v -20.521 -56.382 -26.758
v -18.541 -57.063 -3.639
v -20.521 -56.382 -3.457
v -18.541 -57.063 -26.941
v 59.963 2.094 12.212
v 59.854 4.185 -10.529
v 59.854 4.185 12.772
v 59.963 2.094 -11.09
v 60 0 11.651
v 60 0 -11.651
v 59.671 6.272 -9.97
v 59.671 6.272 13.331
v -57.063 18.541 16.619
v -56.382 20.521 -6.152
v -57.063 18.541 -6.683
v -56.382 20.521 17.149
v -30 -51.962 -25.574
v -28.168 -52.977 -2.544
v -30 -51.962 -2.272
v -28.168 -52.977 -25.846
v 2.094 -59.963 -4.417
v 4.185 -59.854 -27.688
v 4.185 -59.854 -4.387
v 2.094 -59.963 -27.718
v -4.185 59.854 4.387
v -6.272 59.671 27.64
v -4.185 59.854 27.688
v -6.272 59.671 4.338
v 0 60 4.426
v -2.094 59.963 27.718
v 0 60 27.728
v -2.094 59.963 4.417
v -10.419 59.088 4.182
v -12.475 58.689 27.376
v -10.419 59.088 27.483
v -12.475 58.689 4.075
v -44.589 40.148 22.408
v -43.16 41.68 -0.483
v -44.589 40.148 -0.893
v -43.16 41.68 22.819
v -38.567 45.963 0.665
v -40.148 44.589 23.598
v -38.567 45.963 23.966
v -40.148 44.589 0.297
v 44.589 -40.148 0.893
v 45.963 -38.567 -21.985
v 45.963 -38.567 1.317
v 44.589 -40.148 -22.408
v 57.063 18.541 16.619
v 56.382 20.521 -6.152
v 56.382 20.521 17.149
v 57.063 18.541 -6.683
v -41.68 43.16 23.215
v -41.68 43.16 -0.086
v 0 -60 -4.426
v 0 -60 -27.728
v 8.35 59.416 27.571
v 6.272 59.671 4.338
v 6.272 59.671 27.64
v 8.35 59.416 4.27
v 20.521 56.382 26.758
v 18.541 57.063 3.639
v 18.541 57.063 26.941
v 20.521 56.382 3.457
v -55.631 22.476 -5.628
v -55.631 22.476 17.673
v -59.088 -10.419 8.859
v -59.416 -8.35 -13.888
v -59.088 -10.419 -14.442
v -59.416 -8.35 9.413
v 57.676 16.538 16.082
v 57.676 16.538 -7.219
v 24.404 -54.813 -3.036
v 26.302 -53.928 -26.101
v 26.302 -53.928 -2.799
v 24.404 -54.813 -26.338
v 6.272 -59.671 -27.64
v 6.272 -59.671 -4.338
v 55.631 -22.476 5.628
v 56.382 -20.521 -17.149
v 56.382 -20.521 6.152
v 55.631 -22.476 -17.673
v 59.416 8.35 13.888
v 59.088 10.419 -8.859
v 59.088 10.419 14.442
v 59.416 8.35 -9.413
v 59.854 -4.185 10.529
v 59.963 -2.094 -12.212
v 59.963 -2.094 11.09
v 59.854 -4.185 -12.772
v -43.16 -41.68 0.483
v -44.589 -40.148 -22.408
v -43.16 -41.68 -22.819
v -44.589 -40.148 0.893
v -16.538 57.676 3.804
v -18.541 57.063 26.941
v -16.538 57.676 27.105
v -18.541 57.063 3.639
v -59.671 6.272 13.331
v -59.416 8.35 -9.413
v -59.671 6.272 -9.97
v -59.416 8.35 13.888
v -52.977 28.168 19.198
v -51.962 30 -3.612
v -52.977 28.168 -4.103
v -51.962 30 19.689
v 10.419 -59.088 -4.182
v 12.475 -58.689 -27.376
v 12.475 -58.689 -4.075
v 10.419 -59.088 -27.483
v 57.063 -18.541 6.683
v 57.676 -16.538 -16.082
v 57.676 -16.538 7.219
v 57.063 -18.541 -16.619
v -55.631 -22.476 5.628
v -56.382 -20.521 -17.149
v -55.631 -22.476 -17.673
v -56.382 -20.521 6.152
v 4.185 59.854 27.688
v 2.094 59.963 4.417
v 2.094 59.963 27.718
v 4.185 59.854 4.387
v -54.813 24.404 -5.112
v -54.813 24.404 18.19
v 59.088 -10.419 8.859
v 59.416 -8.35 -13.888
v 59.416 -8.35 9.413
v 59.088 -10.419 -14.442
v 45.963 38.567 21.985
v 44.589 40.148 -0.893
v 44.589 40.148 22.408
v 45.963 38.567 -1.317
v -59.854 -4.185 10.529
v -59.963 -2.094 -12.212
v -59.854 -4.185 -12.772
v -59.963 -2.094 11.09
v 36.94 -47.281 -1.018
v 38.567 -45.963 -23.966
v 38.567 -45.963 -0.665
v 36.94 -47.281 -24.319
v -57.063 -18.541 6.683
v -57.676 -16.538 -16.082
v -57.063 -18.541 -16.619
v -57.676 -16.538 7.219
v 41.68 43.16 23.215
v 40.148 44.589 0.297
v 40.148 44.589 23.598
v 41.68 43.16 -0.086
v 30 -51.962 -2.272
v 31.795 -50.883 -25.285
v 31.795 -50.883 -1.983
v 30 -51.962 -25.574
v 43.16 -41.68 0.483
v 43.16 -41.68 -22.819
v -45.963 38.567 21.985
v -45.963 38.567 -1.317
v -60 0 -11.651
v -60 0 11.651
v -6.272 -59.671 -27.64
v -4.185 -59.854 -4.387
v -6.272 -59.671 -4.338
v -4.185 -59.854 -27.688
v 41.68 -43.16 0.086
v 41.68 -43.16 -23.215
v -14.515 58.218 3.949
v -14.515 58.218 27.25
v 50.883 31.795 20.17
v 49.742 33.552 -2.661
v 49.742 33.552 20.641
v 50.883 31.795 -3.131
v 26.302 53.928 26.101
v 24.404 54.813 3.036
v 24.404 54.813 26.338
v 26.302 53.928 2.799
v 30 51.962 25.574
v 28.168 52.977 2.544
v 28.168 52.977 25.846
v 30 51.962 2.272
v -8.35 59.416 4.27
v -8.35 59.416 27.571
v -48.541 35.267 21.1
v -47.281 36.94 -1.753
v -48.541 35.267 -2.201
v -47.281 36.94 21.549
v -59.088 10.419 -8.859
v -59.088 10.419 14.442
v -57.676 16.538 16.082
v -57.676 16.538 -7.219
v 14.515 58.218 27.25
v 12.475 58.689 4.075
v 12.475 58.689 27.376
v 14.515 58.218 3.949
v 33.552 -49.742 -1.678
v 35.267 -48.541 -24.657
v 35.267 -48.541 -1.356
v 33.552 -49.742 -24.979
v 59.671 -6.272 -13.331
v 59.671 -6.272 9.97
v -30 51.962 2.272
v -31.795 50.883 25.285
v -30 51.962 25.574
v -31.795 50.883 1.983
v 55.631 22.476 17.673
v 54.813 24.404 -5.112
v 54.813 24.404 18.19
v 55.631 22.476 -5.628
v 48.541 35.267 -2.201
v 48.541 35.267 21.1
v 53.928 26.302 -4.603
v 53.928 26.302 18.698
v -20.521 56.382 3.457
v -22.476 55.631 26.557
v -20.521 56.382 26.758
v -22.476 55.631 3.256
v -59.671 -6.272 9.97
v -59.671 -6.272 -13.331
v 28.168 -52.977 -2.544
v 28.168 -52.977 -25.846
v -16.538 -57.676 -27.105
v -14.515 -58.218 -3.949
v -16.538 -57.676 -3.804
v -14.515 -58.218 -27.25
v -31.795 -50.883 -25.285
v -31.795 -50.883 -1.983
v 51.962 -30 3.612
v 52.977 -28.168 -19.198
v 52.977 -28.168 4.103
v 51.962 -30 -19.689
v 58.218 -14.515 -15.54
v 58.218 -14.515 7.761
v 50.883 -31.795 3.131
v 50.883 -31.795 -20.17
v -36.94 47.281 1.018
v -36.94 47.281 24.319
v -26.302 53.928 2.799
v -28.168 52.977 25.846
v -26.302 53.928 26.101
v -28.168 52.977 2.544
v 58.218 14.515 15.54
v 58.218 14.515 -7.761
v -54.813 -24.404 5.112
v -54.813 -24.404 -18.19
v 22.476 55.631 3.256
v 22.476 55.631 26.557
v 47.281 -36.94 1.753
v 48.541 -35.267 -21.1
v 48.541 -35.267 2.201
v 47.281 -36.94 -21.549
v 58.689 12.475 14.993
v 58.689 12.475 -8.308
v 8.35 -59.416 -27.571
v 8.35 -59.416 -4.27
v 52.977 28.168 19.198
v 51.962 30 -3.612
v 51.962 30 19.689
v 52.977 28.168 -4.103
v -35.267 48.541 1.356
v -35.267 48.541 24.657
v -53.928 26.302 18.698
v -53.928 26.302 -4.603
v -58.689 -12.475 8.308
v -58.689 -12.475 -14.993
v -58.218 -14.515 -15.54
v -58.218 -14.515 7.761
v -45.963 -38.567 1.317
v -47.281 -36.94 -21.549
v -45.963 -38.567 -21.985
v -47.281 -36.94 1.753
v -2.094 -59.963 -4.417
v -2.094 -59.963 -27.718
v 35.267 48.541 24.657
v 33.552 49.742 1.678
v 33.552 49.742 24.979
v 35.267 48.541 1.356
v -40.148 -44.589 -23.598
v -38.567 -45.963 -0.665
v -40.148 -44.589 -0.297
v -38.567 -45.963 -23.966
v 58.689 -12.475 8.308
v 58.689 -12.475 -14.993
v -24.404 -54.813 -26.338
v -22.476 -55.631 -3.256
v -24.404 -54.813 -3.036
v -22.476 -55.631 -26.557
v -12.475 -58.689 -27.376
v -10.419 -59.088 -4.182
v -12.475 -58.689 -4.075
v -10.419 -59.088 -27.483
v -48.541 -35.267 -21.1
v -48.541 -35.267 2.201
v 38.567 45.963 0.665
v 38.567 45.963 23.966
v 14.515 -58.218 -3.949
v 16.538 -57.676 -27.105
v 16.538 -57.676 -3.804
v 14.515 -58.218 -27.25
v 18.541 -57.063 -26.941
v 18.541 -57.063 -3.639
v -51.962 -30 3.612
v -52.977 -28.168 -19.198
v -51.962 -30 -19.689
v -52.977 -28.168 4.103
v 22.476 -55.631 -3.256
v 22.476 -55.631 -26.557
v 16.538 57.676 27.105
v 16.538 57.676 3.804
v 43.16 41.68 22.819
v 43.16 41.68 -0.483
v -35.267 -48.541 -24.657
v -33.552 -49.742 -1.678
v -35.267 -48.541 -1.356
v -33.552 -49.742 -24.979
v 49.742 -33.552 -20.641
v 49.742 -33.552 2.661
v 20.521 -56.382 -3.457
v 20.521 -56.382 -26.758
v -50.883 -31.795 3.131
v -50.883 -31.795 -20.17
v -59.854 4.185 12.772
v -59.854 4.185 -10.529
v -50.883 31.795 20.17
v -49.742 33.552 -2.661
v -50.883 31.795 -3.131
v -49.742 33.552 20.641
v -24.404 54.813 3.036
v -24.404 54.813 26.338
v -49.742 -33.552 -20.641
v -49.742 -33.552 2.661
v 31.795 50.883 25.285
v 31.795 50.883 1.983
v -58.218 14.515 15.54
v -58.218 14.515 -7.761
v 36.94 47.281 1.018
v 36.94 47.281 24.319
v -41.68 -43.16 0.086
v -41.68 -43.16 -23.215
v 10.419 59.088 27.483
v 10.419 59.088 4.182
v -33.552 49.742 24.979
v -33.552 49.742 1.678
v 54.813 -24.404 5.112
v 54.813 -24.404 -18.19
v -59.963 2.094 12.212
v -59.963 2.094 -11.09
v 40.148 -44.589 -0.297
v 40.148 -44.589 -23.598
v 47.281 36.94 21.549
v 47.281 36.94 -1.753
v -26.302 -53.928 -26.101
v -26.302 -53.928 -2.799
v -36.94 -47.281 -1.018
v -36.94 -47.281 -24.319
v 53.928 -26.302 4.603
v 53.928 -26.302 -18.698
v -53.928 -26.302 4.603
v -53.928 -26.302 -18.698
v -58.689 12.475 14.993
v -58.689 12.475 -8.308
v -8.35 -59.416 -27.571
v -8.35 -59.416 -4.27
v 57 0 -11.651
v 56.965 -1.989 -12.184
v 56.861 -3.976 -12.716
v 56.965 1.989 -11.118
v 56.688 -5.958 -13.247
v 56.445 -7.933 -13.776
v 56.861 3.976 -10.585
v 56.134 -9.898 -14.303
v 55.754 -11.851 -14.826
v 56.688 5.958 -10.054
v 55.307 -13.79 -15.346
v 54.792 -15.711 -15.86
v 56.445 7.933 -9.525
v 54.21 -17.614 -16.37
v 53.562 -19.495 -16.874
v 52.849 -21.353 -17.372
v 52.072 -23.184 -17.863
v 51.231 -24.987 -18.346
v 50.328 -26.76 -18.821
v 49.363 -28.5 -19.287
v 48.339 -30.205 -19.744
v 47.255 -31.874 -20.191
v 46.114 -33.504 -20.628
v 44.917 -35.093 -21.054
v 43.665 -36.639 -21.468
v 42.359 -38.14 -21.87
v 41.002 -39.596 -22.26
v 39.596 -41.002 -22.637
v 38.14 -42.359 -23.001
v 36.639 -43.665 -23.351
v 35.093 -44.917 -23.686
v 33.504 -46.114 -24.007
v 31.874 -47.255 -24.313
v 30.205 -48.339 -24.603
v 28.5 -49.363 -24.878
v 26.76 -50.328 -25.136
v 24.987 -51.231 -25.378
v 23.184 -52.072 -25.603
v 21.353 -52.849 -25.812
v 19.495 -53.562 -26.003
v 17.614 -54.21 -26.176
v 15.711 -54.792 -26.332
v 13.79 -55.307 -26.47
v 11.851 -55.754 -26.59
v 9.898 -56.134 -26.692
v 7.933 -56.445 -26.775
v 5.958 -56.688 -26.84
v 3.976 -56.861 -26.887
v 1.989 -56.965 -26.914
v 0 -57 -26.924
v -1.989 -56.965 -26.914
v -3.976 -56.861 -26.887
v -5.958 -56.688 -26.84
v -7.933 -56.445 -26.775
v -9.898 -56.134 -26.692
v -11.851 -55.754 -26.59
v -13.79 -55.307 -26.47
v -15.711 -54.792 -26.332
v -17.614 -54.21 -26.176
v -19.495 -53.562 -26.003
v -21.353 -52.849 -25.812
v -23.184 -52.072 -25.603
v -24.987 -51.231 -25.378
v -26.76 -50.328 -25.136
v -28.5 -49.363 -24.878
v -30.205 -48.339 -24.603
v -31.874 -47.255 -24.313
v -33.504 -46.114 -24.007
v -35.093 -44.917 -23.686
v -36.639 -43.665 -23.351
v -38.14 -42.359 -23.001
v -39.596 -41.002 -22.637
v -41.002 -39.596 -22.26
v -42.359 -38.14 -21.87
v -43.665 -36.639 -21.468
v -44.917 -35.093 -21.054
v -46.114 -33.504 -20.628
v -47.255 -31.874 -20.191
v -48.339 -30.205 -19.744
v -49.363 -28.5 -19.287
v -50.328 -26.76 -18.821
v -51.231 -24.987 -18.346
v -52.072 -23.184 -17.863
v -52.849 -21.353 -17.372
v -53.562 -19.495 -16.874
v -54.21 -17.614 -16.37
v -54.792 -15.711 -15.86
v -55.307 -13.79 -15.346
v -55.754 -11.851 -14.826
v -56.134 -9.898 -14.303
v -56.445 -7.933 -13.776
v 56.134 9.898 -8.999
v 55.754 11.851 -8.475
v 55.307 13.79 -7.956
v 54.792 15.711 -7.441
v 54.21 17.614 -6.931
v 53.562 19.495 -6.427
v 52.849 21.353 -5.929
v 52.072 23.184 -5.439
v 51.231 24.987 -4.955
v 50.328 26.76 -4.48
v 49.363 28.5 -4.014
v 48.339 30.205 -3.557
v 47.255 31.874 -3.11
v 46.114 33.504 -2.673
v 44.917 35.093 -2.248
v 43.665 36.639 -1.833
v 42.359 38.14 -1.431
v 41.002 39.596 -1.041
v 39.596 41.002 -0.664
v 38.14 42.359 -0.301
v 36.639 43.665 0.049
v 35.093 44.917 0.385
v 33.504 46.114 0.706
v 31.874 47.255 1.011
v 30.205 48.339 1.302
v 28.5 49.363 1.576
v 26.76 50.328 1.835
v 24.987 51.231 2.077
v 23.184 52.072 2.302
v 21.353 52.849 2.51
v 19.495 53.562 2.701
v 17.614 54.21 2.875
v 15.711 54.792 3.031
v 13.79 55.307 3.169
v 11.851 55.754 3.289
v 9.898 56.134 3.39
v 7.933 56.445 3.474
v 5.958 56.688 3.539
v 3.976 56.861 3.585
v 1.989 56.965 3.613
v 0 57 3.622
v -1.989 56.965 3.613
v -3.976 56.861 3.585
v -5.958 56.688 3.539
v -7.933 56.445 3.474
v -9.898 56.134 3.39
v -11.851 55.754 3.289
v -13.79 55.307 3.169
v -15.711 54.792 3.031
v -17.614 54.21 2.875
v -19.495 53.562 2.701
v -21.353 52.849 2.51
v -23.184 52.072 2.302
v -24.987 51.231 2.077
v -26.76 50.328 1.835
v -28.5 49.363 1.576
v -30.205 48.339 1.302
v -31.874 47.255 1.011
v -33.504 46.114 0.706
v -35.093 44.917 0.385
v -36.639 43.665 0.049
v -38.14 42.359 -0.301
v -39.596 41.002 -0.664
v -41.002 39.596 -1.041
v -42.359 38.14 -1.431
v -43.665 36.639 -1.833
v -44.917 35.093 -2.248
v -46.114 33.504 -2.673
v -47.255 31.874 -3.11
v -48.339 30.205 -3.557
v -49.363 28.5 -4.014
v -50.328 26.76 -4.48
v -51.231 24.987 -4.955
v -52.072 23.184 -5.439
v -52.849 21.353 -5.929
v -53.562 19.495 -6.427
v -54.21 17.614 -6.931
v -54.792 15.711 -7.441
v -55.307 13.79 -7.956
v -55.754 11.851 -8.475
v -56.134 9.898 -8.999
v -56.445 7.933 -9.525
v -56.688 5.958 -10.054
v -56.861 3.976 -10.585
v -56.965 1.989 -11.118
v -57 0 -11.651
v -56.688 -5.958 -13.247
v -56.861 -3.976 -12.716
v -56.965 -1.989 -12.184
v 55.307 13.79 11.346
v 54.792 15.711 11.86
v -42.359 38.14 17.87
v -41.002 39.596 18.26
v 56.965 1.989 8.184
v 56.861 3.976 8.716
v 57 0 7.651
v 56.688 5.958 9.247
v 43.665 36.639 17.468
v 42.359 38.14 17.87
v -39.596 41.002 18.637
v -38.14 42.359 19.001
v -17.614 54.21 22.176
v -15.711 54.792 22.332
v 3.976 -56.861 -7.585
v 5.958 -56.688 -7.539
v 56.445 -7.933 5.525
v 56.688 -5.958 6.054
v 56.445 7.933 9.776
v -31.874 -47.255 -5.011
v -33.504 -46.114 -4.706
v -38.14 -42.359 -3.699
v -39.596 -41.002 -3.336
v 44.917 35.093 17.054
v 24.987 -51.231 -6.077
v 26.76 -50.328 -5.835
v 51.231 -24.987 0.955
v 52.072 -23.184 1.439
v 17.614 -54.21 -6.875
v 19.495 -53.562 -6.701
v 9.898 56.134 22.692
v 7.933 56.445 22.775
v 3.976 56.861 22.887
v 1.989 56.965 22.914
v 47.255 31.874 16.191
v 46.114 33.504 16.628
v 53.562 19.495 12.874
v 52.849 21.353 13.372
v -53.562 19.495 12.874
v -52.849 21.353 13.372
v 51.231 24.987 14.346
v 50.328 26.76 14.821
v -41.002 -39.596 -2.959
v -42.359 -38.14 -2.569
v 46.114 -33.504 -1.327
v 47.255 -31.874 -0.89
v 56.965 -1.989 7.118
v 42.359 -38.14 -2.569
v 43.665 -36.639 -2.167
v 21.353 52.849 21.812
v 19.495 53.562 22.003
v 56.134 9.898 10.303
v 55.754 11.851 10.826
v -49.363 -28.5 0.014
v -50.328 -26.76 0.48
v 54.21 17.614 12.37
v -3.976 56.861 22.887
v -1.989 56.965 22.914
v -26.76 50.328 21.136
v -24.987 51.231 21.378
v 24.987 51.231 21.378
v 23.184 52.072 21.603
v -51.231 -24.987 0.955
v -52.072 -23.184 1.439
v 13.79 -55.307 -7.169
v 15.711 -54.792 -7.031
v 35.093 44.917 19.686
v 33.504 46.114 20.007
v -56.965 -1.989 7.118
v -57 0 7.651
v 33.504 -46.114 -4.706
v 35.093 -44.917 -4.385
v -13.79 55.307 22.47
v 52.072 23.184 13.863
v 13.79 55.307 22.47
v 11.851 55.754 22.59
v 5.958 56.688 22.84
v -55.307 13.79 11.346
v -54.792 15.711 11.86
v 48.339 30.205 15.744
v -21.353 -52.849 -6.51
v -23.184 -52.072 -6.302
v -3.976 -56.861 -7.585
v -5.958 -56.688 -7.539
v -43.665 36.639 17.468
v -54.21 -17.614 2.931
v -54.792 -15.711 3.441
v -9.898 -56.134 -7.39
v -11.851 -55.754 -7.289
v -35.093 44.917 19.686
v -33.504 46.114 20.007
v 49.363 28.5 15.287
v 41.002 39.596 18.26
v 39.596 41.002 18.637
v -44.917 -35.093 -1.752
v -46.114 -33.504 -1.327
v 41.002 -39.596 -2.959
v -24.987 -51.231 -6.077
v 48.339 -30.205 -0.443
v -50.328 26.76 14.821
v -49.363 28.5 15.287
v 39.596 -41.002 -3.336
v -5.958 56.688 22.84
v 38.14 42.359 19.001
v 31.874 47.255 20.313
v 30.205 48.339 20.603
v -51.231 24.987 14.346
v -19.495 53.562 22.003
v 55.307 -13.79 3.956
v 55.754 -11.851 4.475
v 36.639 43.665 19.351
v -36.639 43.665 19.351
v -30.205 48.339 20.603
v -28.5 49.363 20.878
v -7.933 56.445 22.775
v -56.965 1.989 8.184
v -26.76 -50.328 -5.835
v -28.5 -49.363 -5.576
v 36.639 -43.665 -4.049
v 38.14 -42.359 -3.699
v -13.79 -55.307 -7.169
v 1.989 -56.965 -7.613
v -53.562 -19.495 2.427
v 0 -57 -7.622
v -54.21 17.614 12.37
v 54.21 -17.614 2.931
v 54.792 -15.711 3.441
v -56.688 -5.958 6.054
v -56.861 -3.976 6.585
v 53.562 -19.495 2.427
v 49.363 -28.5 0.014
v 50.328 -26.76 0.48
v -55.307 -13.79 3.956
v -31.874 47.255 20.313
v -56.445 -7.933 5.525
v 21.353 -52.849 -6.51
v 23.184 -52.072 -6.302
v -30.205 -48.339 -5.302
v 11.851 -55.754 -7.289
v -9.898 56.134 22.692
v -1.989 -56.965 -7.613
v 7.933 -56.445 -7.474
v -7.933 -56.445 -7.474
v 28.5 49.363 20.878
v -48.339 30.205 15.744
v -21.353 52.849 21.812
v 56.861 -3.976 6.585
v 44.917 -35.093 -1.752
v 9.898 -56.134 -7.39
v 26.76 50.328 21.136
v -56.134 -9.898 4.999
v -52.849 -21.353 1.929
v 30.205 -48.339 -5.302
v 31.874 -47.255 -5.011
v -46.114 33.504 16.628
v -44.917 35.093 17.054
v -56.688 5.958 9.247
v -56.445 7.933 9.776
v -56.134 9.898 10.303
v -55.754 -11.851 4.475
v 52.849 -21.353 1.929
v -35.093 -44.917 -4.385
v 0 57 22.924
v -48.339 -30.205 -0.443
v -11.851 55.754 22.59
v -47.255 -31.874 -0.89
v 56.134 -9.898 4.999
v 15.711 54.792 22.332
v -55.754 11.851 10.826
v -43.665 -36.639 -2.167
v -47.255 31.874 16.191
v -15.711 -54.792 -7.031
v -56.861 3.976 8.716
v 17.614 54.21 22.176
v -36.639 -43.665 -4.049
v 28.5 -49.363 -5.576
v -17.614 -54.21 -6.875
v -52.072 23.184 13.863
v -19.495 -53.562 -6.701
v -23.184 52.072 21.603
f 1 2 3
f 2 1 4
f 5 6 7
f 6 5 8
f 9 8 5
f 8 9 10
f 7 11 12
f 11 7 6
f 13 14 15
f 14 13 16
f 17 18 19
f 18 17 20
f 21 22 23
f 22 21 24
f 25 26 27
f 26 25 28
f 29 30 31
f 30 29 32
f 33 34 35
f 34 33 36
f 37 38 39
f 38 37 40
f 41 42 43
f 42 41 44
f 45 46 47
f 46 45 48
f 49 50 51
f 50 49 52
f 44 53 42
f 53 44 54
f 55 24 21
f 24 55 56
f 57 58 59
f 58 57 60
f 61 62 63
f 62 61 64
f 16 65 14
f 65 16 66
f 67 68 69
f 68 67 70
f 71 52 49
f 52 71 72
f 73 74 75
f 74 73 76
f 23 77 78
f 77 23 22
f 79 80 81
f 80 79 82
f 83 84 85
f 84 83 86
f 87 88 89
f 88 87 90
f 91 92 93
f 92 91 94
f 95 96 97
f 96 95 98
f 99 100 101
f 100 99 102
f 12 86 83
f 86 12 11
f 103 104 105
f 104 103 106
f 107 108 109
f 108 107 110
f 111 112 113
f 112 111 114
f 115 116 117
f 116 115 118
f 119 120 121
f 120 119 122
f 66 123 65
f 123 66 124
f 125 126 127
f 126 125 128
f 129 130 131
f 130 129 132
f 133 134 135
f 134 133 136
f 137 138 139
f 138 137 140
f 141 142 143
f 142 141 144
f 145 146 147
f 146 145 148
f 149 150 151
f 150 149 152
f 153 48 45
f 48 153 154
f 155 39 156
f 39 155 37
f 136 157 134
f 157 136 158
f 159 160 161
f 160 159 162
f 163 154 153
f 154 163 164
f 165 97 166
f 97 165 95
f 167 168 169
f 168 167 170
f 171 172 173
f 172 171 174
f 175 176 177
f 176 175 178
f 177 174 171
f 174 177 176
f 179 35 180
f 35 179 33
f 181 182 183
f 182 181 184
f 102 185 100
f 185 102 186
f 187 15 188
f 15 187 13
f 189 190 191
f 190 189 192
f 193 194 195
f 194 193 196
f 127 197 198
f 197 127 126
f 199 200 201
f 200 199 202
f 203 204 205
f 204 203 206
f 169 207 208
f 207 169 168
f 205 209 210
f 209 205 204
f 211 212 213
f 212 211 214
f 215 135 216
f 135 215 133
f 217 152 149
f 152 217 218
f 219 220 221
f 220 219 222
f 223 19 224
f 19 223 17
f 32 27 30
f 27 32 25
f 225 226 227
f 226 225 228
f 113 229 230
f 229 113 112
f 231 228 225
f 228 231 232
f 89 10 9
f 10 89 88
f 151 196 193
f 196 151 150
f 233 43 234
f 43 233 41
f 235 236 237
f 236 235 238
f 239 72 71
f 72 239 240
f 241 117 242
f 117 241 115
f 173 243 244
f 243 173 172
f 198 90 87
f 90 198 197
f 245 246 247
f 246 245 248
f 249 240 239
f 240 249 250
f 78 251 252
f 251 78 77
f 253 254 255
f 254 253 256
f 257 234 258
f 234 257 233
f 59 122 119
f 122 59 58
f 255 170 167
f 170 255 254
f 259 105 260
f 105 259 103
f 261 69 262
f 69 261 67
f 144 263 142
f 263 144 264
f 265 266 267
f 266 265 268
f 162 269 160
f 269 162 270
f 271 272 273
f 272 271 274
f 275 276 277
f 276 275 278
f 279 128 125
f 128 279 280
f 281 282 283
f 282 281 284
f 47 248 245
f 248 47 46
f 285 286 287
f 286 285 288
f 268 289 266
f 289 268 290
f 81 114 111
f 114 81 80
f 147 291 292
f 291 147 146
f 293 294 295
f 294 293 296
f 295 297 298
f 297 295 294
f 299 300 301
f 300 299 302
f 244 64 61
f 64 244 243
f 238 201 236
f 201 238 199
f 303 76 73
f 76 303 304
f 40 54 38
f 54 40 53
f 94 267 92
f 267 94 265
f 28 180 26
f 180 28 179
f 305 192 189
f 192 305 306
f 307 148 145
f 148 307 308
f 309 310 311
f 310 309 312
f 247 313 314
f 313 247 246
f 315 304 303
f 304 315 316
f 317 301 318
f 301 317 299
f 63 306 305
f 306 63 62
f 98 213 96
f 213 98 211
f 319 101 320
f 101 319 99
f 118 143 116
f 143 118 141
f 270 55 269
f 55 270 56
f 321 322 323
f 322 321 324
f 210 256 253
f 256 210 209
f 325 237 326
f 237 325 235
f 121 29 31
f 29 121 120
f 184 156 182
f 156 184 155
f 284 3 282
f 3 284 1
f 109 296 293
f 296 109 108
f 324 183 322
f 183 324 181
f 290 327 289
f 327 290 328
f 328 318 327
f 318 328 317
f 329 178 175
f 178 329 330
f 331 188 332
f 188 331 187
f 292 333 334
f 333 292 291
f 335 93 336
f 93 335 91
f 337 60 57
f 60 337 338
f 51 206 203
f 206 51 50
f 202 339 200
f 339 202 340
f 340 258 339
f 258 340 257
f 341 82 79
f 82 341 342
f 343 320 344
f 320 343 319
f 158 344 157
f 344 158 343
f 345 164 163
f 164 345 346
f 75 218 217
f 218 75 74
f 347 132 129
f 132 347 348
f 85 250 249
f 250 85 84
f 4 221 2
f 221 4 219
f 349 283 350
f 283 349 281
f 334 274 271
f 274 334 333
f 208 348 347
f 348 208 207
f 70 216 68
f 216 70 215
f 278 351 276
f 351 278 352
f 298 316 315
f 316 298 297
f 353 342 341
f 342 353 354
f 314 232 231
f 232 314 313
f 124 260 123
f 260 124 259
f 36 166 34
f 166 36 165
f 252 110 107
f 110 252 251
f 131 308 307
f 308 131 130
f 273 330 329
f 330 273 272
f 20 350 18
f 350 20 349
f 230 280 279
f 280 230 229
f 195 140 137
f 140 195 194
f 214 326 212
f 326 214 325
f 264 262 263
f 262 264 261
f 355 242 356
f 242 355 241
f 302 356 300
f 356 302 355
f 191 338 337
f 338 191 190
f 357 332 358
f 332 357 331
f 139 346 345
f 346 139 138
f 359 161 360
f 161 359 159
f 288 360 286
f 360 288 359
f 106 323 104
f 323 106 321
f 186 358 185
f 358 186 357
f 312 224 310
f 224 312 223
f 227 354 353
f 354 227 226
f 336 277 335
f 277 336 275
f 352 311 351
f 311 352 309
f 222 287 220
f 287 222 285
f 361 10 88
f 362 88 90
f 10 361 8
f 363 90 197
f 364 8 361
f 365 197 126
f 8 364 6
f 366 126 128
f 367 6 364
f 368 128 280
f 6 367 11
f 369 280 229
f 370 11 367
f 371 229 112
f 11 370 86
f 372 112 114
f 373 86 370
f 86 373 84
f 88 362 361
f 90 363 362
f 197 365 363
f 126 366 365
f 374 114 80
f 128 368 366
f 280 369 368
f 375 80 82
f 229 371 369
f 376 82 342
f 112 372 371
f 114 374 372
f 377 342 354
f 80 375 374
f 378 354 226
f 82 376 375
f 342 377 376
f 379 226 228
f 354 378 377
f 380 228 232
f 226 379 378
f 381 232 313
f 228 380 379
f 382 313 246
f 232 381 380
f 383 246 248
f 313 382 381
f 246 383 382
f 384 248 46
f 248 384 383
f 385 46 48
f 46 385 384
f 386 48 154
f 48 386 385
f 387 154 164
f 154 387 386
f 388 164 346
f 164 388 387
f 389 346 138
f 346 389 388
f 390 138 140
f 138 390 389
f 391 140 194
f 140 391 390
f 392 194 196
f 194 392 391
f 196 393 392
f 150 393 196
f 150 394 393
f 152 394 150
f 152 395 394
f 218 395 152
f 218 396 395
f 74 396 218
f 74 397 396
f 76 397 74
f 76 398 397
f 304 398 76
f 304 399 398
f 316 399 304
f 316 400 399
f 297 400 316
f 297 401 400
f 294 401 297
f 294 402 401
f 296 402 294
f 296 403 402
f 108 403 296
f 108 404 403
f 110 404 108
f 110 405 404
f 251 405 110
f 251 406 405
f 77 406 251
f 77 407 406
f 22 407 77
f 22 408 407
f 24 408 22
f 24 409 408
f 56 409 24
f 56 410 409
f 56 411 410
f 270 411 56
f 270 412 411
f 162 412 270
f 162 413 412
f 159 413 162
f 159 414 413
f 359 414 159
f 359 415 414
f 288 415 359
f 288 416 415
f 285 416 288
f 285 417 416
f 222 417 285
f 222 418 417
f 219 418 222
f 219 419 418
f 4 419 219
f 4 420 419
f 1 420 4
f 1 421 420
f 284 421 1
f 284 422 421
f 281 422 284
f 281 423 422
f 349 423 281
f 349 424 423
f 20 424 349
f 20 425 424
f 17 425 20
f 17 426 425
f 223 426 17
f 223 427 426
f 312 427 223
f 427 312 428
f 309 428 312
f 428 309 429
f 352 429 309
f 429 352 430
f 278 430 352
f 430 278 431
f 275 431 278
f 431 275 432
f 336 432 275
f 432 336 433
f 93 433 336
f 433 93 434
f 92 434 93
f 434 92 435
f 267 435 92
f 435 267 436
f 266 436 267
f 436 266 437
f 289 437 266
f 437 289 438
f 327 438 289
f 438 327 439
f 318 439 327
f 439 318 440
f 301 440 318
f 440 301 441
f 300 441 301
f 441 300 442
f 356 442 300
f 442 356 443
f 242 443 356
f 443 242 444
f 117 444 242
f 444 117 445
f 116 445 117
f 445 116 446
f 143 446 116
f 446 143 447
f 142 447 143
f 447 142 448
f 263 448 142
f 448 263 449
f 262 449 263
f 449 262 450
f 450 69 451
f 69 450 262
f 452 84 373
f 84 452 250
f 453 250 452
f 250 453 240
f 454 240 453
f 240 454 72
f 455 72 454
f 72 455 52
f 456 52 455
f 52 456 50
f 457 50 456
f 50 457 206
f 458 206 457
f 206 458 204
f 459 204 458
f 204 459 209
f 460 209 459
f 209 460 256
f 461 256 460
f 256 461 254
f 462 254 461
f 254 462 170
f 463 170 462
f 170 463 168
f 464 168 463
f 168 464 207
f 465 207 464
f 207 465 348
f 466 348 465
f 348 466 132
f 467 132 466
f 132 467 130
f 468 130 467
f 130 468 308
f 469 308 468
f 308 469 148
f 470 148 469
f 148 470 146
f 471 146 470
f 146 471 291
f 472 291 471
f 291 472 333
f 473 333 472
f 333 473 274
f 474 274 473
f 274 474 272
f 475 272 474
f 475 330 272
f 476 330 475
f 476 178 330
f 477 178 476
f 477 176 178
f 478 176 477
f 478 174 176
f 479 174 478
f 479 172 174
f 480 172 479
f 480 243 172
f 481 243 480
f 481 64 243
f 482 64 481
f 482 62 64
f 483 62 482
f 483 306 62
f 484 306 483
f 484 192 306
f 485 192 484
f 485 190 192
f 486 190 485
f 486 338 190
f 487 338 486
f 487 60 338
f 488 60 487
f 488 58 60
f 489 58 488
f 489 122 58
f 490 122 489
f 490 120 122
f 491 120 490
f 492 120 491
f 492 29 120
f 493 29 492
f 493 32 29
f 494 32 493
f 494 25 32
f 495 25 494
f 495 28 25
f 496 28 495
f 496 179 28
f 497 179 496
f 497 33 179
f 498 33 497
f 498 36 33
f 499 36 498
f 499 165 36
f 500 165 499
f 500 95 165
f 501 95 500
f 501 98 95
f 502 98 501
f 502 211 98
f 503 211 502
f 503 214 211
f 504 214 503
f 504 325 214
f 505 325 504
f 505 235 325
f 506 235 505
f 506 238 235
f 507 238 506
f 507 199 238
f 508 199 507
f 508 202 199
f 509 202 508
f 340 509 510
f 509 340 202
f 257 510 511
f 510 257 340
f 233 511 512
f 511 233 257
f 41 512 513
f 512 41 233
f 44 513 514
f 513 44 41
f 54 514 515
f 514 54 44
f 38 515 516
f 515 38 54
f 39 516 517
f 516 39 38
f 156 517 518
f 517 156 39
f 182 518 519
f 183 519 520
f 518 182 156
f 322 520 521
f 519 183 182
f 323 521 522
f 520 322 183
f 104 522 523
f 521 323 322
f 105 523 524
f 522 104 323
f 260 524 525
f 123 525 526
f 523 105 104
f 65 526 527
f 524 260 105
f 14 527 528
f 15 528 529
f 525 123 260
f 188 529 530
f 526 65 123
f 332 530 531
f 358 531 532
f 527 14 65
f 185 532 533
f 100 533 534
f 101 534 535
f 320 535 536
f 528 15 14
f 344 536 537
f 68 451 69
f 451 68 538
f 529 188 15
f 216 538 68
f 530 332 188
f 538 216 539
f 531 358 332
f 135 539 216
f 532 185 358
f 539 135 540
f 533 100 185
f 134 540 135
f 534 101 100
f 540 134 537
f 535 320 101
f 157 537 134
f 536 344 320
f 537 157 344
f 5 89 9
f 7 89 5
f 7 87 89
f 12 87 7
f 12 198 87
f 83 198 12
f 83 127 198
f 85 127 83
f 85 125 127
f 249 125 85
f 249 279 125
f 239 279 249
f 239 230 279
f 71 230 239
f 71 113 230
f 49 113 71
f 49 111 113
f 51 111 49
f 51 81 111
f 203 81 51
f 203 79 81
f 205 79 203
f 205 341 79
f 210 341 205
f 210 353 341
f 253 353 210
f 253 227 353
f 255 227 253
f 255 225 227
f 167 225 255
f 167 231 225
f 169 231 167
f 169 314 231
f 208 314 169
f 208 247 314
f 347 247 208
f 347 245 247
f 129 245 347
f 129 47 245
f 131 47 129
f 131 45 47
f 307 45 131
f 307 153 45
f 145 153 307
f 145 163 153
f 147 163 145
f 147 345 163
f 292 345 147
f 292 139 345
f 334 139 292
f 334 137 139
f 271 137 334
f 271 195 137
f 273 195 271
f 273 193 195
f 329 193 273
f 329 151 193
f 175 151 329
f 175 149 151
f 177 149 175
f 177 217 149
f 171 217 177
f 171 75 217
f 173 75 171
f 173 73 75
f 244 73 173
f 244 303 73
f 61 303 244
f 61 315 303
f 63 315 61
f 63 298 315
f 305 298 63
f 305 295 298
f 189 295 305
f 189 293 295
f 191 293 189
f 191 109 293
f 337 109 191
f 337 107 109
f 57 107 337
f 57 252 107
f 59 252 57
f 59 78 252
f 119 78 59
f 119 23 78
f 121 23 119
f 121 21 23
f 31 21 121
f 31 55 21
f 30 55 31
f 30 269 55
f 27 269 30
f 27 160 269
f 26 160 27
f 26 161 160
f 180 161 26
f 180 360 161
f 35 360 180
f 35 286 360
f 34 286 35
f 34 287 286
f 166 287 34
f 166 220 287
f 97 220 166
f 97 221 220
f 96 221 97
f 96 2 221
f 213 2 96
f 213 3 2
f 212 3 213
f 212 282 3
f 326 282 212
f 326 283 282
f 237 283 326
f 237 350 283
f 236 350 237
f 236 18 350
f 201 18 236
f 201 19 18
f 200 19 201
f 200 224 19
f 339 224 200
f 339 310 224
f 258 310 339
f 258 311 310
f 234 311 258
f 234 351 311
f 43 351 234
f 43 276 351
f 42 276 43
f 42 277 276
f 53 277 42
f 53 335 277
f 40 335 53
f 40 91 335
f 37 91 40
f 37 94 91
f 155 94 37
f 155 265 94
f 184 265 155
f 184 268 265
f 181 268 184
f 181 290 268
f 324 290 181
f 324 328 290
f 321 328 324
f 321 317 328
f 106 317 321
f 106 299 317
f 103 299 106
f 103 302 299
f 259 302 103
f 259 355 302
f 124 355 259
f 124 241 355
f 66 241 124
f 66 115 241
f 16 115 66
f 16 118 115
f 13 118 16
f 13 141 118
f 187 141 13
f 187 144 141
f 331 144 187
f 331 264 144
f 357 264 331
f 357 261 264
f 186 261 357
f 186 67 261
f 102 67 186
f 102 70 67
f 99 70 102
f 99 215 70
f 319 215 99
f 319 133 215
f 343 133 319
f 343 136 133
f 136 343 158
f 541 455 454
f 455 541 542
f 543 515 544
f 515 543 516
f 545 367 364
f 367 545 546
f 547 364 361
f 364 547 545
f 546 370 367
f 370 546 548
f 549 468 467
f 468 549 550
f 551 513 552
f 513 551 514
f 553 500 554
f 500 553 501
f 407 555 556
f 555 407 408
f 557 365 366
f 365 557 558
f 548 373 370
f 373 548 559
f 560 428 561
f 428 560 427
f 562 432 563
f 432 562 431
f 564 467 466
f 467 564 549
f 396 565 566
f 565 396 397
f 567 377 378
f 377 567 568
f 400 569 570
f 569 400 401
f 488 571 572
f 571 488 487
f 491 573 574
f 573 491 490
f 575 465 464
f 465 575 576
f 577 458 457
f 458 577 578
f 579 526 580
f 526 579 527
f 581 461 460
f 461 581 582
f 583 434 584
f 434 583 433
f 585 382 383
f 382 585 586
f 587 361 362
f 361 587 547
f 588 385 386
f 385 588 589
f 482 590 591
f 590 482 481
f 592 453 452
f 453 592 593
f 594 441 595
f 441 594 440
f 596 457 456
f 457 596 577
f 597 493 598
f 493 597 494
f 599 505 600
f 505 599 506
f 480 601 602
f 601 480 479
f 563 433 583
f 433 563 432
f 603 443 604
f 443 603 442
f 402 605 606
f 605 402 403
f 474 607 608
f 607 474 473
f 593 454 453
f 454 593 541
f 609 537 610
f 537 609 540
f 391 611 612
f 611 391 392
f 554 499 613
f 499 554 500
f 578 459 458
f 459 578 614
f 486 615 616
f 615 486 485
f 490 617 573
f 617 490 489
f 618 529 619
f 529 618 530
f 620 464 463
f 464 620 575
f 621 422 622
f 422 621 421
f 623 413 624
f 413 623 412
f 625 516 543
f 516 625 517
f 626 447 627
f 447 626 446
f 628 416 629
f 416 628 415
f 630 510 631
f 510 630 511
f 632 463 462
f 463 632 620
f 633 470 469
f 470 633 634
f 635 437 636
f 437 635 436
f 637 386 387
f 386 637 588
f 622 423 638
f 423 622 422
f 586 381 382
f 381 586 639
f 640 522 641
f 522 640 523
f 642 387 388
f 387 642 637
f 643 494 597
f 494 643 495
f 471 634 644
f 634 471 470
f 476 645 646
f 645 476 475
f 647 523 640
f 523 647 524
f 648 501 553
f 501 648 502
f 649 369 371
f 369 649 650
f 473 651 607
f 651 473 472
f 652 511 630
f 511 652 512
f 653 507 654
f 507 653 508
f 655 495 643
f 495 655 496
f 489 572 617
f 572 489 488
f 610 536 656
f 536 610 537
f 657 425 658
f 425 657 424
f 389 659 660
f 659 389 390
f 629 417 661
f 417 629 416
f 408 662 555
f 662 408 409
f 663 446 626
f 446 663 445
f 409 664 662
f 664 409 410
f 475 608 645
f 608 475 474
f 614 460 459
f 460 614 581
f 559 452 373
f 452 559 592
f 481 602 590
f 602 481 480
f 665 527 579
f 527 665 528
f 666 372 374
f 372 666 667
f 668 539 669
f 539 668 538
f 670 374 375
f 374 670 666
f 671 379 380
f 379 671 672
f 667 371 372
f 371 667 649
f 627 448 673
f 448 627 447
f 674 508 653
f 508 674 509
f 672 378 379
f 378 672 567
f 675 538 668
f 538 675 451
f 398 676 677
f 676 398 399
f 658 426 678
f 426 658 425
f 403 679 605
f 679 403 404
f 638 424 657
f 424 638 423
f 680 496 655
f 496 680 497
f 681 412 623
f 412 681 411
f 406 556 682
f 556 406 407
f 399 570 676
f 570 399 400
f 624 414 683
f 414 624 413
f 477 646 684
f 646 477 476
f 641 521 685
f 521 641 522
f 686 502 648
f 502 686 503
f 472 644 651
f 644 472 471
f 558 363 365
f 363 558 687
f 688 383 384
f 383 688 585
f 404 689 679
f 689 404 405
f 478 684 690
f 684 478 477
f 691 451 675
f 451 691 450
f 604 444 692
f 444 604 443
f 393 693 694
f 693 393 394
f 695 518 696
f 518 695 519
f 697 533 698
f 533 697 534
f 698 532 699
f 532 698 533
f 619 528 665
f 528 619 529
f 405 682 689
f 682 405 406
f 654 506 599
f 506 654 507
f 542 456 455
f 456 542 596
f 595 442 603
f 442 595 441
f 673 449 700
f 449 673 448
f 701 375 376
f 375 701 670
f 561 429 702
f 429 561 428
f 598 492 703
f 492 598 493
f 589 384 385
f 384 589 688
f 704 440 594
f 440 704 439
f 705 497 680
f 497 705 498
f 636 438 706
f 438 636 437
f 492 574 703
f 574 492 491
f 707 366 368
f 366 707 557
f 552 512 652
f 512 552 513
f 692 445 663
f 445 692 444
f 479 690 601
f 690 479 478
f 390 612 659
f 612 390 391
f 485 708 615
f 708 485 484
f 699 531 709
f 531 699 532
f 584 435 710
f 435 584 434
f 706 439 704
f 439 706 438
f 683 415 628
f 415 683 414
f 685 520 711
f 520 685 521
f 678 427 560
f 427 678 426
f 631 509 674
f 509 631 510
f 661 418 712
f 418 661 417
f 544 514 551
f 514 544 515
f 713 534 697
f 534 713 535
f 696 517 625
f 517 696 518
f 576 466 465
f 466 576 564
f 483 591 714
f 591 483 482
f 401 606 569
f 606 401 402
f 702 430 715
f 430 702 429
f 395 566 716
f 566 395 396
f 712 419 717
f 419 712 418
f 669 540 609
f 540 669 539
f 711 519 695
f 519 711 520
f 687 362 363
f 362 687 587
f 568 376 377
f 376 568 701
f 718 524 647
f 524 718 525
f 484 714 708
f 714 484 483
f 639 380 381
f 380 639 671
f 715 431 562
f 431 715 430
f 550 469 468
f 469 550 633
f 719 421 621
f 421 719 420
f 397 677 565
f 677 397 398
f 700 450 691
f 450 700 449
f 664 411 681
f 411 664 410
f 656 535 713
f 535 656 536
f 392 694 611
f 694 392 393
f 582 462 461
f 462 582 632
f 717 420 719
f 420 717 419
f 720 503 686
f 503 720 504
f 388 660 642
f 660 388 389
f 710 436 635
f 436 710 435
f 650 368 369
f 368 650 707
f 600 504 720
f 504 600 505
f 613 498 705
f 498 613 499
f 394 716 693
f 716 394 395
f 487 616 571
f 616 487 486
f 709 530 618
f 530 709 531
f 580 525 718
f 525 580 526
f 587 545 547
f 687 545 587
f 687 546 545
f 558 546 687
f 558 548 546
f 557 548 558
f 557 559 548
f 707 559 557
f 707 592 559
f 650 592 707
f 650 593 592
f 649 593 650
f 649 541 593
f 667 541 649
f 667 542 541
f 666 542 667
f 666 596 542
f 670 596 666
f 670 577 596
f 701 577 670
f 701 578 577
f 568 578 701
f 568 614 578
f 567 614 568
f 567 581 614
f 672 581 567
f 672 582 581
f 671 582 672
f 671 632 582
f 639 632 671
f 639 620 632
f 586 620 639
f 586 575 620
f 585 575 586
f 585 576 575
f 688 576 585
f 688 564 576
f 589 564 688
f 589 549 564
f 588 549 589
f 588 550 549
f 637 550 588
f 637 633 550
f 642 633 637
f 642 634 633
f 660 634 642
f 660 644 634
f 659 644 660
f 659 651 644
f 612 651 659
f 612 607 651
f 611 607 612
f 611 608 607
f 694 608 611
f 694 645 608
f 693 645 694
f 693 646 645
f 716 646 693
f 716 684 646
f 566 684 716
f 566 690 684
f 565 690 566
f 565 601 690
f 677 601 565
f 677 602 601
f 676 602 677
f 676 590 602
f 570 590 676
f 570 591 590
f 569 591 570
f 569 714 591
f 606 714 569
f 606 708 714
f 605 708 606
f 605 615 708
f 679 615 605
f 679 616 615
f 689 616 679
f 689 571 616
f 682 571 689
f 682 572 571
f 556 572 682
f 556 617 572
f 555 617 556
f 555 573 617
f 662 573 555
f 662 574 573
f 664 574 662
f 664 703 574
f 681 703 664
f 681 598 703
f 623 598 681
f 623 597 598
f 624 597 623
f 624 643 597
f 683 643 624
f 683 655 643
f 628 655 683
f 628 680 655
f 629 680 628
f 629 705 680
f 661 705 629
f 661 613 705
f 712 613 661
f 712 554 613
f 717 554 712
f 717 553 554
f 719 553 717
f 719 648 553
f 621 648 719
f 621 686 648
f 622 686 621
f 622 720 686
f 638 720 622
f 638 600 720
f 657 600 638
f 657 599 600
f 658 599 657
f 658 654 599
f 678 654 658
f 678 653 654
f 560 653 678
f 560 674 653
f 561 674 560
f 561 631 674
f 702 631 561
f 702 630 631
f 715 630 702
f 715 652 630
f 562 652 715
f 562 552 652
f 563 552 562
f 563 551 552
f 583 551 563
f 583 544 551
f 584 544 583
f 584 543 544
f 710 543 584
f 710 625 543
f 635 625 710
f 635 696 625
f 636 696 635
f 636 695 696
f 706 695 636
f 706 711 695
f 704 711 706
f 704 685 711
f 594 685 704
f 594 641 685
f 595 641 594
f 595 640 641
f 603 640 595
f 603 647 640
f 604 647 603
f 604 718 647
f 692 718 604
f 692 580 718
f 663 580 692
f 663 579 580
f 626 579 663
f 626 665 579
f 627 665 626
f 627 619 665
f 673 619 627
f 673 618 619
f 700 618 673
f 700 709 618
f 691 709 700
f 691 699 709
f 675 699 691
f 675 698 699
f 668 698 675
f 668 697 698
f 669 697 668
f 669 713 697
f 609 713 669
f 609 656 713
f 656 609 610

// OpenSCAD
// Hollow cylinder with parallel 15° cuts
// All dimensions in millimeters

// Parameters
radius = 60;
diameter = 120;
wall_thickness = 3;
height = 16;           // Height at shortest point
angle = 15;

// Calculate required extra height due to angle
extra_height = diameter * tan(angle);
total_height = height + extra_height;

module block() {
    rotate([angle, 0, 0])
        translate([-diameter, -diameter, -total_height/2])
        cube([diameter * 2, diameter * 2, total_height], center=false);
}

module angledCylinder(height, diameter) {
    difference() {
        cylinder(h = height*3, d = diameter, center=true, $fn = 180);
        //cylinder(h=height*3, r1 = diameter/2*1.05, r2 = diameter/2, center=true, $fn=180)
        
        translate([0, 0, -(height/2 + total_height/2)])
            block();
        translate([0, 0, +(height/2 + total_height/2)])
            block();
    }
}

difference() {
    angledCylinder(height=25, diameter=120);
    translate([0, 0, -4])
        angledCylinder(height=25, diameter=114);
}
